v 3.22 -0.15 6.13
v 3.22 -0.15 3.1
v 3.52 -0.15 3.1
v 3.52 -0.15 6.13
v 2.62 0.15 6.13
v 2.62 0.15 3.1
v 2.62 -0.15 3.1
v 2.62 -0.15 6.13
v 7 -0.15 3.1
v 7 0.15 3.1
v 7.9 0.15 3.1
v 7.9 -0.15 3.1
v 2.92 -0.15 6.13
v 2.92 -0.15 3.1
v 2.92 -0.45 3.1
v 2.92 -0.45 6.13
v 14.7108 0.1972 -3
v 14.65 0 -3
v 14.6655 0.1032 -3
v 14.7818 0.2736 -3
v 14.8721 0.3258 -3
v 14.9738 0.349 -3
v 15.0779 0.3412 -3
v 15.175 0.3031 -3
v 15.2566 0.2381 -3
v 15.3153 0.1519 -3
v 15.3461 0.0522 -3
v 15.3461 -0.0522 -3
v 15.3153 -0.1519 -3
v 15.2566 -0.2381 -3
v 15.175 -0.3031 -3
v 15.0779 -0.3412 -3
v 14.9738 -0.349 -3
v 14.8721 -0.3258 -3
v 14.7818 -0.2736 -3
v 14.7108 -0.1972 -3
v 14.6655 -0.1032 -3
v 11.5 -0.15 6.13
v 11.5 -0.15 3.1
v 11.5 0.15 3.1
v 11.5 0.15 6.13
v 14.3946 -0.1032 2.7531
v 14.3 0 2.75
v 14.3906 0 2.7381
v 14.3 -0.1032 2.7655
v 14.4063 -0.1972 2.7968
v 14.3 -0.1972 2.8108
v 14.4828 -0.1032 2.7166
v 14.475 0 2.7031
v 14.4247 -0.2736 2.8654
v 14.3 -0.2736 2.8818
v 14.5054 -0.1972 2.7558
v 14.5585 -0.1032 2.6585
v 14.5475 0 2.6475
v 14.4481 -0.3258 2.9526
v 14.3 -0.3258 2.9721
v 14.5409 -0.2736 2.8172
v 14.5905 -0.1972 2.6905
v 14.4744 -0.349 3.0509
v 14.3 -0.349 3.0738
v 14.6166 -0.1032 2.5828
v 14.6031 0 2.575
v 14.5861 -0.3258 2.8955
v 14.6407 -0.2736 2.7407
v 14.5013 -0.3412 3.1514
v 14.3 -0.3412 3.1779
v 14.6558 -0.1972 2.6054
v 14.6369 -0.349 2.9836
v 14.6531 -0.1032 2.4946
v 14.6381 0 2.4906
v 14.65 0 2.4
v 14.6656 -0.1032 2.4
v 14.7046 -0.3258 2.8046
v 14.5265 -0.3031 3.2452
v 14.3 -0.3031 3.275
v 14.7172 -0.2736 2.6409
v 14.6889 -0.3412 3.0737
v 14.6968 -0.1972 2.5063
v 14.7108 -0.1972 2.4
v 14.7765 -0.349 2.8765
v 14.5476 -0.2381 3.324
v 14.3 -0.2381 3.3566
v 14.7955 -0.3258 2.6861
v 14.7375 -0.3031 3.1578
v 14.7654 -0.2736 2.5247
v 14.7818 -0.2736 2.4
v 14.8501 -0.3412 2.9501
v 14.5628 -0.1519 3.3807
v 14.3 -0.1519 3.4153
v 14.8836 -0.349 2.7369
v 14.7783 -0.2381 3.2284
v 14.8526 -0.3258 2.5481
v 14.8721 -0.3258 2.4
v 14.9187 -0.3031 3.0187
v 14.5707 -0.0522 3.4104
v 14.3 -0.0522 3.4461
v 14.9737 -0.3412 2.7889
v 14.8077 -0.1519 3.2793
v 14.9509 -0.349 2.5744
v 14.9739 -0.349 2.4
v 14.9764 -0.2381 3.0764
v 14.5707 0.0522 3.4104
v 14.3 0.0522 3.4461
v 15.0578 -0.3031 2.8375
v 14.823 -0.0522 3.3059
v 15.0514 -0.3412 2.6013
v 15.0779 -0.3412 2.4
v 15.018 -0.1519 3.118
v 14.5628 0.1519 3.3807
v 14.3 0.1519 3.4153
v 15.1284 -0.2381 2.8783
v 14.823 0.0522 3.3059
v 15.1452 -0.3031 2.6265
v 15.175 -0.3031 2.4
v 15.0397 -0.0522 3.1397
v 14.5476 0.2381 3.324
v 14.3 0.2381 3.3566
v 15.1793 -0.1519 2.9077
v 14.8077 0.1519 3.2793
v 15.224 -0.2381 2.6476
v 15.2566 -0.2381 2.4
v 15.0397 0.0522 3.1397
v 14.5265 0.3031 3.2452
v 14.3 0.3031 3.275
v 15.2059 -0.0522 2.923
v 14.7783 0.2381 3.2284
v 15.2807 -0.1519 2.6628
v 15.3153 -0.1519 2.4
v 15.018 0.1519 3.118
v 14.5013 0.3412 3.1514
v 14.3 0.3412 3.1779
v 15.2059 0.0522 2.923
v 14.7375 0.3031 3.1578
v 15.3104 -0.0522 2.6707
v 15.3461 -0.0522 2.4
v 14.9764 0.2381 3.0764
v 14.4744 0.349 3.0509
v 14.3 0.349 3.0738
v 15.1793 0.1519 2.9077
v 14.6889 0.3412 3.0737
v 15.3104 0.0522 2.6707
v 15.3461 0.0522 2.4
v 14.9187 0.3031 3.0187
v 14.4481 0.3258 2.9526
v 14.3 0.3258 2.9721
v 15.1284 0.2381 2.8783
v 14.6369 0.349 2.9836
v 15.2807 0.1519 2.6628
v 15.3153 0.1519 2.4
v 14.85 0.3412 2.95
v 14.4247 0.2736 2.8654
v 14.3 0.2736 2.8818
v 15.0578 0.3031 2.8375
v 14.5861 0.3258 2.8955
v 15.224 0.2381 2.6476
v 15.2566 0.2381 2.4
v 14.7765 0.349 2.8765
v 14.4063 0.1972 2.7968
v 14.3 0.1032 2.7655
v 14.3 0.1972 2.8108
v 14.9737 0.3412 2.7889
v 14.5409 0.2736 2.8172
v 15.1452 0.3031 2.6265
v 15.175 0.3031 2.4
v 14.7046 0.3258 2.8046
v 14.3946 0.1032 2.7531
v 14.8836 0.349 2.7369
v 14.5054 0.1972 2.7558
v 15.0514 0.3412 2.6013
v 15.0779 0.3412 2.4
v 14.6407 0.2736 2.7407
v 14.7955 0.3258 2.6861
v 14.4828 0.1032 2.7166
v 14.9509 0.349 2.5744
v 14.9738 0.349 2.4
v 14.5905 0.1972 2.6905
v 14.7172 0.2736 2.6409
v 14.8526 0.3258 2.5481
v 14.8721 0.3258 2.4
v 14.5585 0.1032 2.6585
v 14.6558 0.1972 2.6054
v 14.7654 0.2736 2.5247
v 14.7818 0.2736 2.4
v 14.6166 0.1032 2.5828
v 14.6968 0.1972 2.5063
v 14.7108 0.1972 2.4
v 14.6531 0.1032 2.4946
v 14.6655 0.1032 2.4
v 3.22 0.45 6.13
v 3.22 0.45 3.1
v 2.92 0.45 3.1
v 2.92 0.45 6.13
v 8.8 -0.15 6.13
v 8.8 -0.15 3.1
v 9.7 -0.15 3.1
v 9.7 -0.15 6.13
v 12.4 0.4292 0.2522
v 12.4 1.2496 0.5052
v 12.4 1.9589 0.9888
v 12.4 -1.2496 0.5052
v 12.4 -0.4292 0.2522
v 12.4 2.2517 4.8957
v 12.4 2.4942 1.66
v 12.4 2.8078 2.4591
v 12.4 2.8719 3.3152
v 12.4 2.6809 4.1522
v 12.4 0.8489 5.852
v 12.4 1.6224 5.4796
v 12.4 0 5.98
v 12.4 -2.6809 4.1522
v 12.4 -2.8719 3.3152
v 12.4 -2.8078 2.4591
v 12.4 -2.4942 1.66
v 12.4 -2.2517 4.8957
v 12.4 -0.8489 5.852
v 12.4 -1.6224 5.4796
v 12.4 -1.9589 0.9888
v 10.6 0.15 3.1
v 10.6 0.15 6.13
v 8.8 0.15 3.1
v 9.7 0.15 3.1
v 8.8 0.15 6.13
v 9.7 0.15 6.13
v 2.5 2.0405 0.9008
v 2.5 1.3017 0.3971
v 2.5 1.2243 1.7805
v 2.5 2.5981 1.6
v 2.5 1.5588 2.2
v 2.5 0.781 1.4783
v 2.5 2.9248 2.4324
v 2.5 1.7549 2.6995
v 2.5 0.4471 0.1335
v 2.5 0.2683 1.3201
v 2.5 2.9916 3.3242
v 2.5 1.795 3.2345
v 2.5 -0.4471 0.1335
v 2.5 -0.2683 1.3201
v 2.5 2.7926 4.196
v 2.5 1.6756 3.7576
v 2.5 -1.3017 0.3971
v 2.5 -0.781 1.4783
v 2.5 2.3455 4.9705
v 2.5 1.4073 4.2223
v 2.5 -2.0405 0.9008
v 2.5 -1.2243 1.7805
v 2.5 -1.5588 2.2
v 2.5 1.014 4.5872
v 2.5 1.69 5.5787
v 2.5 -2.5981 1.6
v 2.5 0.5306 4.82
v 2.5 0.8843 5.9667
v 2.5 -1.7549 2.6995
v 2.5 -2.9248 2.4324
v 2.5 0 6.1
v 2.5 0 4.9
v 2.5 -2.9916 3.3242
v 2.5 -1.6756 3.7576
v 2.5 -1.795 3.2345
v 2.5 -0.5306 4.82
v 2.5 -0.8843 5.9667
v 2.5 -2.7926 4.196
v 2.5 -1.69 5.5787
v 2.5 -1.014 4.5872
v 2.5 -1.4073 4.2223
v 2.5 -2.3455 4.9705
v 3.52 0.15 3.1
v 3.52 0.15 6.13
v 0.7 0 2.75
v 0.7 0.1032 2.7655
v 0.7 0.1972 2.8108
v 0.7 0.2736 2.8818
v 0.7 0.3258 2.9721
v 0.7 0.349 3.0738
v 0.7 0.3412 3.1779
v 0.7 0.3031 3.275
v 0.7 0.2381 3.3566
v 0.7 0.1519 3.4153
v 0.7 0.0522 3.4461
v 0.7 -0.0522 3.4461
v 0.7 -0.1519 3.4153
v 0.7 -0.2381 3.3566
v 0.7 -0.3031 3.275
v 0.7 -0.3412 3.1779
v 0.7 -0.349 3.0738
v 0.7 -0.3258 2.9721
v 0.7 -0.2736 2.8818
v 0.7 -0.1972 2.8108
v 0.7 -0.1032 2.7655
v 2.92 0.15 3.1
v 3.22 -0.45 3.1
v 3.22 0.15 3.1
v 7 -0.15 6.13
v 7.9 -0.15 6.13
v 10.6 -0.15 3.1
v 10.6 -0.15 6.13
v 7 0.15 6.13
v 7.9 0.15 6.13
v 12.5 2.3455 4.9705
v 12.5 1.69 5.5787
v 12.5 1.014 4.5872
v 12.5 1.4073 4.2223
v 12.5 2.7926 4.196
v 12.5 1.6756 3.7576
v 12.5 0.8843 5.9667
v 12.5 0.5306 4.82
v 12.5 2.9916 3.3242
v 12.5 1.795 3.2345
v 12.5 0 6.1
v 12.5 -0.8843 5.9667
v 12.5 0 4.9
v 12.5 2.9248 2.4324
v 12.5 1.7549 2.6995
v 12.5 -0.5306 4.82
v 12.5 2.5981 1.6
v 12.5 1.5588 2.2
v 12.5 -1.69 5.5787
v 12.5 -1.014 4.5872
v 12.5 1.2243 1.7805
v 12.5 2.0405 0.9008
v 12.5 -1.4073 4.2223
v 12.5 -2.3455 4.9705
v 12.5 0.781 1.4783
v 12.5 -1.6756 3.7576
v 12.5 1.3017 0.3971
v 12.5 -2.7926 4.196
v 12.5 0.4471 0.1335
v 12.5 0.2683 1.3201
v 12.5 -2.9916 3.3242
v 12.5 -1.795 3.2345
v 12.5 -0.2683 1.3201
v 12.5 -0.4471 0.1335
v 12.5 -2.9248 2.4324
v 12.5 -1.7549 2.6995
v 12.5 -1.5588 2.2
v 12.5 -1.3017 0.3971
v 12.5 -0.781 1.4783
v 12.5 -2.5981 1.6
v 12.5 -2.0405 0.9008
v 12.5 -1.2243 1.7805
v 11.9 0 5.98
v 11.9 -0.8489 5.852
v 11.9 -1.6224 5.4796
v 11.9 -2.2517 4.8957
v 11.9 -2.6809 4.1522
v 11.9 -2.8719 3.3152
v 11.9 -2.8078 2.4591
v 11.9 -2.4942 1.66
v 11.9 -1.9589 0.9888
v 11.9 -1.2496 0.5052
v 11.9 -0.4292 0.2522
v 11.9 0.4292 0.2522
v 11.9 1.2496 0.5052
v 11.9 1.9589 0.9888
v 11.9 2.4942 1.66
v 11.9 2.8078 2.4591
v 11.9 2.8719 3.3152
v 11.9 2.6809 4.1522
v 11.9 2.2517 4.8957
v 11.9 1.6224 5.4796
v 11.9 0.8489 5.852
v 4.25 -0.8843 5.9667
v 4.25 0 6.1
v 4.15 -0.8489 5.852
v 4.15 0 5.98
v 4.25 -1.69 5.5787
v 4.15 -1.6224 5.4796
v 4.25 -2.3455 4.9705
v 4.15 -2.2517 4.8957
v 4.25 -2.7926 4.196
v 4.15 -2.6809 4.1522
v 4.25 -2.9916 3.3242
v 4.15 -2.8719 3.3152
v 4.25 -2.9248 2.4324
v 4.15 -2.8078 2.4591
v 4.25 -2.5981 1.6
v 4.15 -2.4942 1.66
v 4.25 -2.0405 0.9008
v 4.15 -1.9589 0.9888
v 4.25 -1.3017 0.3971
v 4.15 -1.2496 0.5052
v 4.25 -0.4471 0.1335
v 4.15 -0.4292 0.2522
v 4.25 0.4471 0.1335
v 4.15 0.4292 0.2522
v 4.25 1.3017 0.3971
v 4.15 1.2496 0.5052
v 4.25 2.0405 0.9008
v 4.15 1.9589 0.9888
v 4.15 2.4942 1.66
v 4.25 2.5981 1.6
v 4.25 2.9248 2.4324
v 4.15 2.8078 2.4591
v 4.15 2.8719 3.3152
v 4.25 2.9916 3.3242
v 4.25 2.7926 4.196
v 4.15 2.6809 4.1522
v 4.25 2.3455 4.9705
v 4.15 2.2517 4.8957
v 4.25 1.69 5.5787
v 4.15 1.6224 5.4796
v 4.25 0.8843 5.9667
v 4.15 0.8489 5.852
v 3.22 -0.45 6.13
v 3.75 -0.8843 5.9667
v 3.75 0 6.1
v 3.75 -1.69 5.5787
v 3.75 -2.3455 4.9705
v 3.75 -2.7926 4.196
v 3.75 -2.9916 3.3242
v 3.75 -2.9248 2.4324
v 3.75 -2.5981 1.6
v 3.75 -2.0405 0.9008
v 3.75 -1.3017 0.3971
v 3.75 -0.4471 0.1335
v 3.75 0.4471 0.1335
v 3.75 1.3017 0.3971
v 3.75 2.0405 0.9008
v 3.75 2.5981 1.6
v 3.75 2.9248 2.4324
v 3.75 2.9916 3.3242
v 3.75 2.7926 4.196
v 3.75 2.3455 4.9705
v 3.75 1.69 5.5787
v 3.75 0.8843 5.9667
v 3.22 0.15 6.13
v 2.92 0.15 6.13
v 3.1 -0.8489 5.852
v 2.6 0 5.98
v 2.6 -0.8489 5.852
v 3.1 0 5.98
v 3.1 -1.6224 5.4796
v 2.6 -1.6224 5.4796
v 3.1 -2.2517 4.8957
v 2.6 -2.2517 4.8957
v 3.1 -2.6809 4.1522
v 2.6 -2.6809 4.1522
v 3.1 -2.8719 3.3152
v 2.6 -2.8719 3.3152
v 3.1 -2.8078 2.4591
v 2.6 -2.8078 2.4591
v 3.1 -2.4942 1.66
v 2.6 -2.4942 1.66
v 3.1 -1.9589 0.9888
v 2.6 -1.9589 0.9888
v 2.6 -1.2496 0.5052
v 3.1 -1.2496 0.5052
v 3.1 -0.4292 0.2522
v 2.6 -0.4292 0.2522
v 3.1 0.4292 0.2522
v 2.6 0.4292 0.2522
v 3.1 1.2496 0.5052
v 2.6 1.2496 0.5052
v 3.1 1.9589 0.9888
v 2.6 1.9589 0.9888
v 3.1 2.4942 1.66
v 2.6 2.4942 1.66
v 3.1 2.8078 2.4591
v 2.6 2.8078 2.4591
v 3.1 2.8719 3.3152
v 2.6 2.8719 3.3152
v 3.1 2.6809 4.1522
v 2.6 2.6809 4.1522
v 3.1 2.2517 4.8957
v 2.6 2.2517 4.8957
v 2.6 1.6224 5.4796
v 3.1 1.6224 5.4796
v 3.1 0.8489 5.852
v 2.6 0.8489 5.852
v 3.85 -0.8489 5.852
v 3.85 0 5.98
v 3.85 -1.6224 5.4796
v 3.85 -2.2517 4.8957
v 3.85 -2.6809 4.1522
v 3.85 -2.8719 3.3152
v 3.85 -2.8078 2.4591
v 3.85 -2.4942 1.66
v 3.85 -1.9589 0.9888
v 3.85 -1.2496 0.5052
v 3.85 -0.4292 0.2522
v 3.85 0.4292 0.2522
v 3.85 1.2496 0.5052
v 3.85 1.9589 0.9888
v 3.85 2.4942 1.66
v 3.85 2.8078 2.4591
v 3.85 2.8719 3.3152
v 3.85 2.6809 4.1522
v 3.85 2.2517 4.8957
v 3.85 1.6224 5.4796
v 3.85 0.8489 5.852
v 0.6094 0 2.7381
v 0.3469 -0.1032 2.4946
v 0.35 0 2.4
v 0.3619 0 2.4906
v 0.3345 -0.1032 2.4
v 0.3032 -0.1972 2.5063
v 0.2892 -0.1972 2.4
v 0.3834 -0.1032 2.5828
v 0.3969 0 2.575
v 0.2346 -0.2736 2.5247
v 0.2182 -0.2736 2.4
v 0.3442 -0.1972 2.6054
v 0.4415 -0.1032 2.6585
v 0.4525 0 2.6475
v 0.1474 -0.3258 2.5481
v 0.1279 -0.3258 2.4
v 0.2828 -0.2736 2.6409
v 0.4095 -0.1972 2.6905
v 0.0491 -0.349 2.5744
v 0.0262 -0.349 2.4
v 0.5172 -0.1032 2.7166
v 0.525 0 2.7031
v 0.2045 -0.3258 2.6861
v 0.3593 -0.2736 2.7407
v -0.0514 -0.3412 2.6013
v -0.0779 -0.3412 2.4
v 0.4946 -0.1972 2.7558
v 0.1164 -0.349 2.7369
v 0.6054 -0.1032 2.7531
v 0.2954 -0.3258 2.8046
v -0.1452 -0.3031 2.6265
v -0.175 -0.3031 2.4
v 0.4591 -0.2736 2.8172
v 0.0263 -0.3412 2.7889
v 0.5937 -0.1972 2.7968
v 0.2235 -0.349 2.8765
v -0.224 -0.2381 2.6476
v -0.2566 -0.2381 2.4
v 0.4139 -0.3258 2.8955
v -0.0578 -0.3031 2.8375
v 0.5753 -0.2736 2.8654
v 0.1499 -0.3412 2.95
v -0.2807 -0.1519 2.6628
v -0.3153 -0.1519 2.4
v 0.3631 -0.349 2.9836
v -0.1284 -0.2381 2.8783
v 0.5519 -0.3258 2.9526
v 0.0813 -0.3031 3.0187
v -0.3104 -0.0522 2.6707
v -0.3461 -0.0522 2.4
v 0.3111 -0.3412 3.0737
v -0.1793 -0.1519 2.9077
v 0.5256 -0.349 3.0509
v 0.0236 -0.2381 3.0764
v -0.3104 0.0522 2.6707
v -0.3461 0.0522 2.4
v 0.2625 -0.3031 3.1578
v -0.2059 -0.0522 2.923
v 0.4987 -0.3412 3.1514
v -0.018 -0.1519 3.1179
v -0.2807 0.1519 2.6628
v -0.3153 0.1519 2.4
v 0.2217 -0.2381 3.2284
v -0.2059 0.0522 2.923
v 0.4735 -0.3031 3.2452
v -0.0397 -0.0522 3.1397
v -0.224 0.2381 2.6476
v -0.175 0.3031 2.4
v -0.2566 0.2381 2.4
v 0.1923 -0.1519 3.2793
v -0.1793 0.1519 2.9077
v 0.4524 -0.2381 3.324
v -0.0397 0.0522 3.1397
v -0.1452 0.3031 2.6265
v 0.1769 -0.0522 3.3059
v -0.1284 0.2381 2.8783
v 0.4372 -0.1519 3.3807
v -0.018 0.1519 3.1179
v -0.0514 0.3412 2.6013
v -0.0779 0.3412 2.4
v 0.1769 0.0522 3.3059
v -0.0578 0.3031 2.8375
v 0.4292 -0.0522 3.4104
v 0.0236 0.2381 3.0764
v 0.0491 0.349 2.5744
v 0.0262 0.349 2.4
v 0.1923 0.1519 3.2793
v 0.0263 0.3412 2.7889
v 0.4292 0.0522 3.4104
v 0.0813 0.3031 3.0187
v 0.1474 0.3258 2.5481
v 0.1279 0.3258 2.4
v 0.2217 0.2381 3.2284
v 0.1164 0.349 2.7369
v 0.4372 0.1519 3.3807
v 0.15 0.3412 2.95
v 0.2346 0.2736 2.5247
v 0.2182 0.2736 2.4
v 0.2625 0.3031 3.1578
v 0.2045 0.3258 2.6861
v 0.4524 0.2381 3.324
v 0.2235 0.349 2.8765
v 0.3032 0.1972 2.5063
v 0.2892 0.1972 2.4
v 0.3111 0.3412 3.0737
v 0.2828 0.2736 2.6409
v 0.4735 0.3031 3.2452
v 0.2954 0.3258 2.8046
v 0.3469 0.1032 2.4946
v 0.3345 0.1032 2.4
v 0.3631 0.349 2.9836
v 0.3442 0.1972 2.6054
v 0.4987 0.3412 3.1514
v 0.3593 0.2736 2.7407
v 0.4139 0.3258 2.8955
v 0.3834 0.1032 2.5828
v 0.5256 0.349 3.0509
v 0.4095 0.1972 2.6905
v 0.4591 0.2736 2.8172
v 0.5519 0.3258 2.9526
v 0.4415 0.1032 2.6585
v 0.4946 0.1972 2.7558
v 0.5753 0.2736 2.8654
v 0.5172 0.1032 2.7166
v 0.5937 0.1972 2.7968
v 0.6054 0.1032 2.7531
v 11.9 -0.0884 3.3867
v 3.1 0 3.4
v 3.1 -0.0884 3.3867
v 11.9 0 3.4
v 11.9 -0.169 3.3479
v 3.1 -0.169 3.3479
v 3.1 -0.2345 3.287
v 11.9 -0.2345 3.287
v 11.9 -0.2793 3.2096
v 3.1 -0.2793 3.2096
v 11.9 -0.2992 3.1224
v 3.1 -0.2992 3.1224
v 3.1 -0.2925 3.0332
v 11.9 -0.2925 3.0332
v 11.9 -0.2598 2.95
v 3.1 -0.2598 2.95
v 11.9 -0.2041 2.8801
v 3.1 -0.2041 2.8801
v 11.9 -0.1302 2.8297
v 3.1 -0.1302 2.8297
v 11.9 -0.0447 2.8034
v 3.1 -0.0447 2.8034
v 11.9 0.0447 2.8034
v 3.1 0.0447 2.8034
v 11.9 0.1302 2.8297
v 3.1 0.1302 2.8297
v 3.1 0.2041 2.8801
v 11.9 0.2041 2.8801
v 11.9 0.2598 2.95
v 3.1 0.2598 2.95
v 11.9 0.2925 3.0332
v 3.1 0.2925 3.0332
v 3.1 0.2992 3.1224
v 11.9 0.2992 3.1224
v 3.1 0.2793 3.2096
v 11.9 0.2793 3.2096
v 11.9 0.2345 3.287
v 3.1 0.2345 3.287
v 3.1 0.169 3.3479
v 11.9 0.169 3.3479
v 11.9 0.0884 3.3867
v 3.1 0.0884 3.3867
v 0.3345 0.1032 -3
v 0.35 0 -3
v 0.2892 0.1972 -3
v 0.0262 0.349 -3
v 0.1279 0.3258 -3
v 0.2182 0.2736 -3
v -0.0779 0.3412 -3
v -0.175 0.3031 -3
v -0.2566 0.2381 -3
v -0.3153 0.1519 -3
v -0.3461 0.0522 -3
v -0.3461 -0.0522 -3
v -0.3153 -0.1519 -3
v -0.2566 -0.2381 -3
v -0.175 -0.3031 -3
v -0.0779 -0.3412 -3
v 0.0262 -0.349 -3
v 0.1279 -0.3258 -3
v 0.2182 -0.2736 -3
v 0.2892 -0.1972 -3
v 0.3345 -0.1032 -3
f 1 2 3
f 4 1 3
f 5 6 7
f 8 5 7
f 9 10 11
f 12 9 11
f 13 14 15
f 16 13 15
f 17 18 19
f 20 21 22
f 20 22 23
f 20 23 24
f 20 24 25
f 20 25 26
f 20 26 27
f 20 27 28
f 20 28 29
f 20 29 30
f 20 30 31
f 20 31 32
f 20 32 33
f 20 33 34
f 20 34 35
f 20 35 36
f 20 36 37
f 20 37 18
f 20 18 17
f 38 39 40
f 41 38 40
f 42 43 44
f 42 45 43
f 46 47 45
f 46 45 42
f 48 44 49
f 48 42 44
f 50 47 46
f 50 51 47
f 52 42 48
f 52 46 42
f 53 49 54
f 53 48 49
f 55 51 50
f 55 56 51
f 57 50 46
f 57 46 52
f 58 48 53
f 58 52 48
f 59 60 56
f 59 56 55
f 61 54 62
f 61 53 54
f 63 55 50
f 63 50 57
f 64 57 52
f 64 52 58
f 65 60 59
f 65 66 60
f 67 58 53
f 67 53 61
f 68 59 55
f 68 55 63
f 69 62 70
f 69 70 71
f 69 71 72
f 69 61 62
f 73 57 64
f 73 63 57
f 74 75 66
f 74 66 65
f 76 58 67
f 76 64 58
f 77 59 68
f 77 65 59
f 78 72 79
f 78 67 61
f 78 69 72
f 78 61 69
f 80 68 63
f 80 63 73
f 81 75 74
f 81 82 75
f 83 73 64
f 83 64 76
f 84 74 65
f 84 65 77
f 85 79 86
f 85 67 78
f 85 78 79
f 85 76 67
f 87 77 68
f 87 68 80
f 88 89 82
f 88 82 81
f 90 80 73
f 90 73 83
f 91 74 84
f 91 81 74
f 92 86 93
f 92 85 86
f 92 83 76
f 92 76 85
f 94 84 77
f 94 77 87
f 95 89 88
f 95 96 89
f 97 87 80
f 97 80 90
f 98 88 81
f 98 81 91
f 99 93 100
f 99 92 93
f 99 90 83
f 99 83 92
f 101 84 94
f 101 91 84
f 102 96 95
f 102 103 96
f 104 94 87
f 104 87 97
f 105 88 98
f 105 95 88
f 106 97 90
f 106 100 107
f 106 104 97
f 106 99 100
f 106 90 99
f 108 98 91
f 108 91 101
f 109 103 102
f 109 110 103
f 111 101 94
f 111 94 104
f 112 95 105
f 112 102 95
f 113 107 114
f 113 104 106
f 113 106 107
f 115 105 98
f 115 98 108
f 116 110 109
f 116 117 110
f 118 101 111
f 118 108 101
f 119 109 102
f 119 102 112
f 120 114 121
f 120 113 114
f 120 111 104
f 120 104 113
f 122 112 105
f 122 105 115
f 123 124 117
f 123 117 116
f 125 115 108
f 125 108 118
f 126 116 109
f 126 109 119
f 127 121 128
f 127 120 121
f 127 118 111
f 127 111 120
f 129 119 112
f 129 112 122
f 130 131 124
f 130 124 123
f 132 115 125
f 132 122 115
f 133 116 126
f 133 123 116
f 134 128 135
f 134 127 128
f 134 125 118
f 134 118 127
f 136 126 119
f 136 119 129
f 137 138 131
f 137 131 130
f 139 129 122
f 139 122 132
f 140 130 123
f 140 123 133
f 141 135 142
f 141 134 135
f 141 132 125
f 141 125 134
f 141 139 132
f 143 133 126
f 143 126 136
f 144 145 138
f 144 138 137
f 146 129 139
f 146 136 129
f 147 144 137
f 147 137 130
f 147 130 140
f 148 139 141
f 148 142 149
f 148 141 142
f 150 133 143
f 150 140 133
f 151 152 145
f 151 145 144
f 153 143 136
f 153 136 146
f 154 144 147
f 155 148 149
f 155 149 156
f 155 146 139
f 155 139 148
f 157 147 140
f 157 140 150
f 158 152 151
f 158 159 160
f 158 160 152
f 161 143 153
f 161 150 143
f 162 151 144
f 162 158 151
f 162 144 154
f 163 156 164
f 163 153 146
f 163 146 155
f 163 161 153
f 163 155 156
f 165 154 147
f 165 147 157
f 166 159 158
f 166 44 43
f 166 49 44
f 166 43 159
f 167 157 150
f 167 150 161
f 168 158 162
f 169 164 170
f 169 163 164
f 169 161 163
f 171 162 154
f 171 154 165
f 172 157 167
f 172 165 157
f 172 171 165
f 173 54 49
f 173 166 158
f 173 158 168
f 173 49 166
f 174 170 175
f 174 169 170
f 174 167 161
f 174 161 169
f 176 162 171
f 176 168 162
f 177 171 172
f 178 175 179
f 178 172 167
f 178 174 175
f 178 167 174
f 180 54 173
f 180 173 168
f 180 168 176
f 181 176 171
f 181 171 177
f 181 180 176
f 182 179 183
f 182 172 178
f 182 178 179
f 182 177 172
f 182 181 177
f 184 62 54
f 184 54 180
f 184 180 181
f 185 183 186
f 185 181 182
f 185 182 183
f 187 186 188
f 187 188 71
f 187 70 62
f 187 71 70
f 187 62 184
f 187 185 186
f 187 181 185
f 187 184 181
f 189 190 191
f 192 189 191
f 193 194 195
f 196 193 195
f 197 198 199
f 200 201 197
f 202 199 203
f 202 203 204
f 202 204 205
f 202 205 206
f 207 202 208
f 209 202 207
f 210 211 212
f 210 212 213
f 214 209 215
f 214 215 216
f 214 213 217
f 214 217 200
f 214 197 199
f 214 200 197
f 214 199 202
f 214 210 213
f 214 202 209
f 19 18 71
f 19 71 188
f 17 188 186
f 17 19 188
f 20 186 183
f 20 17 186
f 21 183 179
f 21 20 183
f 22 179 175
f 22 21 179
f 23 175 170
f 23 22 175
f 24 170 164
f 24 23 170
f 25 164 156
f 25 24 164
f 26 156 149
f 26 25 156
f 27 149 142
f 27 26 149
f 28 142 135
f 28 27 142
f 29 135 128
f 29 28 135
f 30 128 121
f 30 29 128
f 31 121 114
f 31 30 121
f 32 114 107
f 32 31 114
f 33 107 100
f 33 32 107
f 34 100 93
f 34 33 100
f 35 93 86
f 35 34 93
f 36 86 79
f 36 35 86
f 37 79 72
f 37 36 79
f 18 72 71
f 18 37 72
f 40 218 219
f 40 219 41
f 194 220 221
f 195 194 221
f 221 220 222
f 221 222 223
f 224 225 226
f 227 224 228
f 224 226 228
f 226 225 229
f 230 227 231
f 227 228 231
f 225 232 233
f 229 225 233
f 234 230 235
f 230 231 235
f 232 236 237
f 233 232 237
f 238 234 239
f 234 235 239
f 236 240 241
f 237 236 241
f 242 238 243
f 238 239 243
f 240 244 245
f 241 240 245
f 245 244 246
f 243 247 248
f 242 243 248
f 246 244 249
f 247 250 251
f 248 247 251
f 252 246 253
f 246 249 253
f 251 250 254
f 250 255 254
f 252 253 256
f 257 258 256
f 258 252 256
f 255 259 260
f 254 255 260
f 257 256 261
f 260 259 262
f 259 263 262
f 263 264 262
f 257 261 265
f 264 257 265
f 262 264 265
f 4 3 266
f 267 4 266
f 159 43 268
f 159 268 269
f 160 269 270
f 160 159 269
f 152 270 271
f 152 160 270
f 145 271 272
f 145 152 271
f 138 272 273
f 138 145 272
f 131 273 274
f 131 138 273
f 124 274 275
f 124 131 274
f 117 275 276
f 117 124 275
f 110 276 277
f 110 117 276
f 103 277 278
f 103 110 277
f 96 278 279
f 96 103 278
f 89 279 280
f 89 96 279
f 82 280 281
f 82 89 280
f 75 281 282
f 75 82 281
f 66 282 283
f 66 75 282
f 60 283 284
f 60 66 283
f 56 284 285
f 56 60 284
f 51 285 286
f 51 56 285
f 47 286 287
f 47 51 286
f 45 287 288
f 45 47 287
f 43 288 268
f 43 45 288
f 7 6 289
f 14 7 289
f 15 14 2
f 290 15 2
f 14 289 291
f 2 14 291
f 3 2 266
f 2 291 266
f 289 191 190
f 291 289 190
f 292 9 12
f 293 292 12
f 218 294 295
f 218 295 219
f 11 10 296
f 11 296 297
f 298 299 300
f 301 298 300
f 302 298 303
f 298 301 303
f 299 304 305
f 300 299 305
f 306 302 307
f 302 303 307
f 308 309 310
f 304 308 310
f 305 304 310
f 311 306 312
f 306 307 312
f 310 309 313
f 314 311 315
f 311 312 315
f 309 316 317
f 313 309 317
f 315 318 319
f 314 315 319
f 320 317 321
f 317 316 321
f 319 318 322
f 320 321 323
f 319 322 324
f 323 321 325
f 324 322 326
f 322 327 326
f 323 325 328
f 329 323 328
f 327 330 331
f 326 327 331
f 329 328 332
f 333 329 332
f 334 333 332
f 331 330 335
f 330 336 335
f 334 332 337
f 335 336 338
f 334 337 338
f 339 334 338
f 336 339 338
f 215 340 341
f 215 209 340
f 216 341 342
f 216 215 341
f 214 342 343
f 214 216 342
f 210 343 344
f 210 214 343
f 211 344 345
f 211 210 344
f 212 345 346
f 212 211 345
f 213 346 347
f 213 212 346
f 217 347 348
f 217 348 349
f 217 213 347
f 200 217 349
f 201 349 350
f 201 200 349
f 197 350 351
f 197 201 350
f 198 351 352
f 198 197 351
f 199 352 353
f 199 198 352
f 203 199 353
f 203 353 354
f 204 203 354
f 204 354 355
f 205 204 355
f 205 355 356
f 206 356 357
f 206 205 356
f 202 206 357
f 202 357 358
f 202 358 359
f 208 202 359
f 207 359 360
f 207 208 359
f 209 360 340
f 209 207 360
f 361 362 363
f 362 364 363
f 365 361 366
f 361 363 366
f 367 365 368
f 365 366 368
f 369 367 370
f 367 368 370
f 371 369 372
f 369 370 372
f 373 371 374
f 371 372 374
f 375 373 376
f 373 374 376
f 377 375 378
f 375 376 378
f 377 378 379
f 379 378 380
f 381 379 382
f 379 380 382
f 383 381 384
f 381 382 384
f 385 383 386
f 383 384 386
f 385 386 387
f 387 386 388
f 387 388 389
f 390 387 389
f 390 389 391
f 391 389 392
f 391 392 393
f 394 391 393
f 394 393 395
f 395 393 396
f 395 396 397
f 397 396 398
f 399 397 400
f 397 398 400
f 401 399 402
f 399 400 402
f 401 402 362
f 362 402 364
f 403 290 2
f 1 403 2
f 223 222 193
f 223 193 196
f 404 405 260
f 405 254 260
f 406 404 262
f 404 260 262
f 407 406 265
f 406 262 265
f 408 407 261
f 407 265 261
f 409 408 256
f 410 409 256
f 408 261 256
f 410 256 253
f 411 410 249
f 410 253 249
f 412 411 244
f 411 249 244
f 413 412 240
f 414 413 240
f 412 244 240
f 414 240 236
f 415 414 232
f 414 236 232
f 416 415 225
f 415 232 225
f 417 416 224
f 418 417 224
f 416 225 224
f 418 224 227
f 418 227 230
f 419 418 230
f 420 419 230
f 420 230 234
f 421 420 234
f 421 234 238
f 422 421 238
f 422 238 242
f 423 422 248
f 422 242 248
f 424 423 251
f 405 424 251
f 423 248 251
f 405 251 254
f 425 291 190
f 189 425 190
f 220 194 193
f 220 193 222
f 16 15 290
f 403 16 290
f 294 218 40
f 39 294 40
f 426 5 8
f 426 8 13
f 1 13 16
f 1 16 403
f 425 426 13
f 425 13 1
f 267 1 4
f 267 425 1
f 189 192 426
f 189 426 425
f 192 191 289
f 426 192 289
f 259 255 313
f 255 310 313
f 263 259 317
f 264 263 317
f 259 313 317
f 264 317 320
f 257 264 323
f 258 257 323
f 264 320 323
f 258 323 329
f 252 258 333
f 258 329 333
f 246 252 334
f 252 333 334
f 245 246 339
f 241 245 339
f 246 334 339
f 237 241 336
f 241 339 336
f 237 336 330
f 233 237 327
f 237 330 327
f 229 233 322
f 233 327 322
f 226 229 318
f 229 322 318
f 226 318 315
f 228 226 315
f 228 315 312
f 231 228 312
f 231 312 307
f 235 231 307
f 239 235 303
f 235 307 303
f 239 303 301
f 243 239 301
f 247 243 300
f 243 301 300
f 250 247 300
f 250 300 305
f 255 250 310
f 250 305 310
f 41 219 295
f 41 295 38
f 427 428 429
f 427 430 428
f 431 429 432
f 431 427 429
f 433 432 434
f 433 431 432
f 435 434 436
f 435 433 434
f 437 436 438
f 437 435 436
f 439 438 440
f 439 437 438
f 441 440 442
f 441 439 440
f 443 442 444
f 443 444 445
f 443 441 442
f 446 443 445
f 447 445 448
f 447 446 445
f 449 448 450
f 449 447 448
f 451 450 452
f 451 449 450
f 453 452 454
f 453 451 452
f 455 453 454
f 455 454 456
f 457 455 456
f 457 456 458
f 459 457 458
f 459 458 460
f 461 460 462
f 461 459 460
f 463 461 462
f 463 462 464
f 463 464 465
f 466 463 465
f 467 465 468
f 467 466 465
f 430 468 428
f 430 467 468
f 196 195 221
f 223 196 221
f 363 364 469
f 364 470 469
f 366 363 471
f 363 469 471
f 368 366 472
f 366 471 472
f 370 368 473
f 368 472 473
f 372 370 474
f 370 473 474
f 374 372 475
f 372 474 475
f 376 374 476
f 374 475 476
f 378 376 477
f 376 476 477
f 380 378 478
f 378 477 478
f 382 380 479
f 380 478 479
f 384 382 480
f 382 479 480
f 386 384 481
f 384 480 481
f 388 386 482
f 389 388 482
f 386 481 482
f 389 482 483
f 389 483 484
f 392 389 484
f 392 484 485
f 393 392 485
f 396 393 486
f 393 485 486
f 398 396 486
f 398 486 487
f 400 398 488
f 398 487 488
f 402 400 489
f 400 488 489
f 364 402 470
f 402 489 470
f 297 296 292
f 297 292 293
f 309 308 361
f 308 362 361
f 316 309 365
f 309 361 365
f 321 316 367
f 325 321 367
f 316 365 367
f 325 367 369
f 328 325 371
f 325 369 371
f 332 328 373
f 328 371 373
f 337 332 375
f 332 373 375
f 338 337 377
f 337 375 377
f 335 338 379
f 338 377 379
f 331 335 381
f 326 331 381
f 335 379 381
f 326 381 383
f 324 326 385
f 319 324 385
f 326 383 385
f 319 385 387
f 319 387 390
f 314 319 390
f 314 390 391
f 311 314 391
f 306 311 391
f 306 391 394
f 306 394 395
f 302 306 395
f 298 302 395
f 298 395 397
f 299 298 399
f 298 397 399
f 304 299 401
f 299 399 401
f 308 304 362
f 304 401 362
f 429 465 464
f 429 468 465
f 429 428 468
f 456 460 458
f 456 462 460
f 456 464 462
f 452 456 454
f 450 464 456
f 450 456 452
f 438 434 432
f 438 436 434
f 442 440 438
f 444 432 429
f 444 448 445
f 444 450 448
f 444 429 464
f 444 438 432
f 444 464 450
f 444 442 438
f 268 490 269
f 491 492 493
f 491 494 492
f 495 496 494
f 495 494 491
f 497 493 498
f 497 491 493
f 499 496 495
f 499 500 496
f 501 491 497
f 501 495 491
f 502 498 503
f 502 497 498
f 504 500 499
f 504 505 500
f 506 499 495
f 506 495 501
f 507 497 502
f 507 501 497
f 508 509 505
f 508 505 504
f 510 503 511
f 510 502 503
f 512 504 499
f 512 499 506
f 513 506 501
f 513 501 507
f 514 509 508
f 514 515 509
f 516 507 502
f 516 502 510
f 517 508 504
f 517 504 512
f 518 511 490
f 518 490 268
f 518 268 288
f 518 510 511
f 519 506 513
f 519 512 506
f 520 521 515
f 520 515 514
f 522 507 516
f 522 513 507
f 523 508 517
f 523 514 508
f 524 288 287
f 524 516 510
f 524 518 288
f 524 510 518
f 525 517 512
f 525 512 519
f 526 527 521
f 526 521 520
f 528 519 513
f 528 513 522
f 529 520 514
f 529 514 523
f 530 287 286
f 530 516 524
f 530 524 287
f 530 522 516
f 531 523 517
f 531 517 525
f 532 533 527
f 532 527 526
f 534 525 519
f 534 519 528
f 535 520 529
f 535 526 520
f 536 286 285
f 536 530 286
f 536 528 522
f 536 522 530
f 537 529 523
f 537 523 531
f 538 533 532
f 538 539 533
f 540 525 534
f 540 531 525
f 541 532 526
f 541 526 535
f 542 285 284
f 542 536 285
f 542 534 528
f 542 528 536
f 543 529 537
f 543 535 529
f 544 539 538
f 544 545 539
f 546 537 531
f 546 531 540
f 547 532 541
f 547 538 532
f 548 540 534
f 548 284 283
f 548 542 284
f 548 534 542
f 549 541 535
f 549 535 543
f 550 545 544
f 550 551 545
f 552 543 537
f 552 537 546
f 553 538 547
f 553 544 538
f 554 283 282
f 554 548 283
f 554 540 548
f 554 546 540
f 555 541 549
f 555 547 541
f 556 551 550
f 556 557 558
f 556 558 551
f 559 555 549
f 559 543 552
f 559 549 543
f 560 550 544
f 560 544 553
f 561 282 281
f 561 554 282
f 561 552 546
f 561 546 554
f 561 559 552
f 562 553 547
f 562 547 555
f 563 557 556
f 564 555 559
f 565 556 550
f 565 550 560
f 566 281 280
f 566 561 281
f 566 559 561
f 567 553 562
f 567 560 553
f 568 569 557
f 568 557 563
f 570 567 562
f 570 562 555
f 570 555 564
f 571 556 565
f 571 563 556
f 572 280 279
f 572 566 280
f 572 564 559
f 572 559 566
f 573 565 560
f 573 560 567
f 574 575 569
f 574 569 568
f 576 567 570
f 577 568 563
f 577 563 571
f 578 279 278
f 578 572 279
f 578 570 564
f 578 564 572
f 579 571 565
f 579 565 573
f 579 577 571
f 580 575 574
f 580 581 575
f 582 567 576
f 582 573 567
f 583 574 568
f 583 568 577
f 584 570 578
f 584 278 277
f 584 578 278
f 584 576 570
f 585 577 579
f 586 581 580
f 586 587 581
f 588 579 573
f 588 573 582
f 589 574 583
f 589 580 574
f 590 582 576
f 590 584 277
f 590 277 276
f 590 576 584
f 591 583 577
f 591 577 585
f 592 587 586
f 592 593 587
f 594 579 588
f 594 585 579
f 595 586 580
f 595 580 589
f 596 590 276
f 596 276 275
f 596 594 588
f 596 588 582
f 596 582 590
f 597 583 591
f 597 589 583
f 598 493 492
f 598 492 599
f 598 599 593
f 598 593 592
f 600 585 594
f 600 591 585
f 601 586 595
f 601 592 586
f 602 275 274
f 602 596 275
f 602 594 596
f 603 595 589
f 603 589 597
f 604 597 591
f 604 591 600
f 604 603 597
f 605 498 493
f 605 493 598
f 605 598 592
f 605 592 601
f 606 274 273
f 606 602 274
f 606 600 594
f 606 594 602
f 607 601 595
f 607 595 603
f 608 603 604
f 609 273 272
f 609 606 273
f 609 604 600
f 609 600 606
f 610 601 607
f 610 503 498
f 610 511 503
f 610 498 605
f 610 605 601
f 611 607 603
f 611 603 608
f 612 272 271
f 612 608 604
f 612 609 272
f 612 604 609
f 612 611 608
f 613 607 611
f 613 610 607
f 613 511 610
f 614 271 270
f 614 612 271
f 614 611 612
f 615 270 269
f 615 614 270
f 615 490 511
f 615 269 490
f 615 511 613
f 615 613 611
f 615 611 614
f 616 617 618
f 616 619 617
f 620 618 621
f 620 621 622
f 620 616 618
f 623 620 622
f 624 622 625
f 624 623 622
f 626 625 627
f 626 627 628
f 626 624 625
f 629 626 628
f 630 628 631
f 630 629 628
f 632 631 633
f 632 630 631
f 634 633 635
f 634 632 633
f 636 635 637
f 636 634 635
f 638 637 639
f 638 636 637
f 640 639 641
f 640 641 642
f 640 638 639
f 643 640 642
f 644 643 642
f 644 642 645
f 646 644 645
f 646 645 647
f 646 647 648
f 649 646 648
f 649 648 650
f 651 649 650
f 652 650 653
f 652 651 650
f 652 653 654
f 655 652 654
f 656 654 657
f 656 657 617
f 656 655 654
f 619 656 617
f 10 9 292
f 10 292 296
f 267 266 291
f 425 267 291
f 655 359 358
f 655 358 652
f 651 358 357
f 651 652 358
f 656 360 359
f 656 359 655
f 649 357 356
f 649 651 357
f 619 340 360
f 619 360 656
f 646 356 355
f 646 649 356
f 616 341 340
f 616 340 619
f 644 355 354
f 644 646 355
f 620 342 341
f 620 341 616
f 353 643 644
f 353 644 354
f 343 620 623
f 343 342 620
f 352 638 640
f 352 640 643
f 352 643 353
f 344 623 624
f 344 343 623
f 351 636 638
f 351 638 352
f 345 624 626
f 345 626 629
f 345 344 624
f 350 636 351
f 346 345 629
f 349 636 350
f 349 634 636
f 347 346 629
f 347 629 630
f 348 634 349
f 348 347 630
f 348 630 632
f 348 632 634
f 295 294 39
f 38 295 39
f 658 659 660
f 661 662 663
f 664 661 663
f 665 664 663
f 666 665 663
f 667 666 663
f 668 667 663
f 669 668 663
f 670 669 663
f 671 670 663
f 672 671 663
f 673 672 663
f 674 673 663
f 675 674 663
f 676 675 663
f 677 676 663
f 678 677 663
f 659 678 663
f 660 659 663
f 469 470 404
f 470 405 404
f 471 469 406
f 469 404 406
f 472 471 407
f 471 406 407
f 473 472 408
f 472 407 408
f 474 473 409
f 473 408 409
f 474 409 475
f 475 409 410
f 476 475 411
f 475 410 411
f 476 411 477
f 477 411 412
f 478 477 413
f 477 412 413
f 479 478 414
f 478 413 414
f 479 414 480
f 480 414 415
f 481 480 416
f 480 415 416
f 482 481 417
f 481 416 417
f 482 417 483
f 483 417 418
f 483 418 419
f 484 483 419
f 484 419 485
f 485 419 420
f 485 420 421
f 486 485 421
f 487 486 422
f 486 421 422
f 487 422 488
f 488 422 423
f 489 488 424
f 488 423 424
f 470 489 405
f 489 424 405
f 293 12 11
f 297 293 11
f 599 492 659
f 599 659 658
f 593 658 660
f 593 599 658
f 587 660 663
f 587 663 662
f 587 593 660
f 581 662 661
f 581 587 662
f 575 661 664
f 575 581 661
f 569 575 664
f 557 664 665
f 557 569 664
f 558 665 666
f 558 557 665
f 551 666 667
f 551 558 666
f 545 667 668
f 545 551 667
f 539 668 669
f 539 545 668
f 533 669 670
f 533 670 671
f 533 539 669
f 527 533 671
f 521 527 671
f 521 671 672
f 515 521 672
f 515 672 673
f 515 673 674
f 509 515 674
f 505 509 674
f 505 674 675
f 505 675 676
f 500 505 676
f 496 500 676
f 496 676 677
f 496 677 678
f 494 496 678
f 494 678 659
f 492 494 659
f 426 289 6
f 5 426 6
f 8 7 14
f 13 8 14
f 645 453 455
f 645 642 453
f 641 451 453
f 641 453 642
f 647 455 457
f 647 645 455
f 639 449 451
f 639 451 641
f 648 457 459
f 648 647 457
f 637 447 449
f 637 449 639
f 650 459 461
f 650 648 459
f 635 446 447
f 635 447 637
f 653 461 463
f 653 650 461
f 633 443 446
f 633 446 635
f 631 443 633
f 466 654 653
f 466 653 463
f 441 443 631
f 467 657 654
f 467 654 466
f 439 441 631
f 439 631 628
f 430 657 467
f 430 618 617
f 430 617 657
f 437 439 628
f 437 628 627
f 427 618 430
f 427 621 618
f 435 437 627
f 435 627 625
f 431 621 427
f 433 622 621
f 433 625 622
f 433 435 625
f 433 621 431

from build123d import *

# Parameters (mm, degrees)
SKETCH_R    = 0.35
SKETCH004_W = 0.9
SKETCH004_H = 0.3
PAD_DEPTH   = 3.03


with BuildPart() as sweep_body:
    # Sweep: sweep along a path in Sketch001
    with BuildLine(Plane.XZ) as sweep_path:
        Line((0, -3), (0, 2.4))
        ThreePointArc((0, 2.4), (0.205022, 2.894971), (0.699989, 3.1))
        Line((0.699989, 3.1), (14.3, 3.1))
        ThreePointArc((14.3, 3.1), (14.794975, 2.894975), (15, 2.4))
        Line((15, 2.4), (15, -3))
    # Sketch → Sweep (sweep)
    with BuildSketch(Plane.XY.offset(-2)):
        Circle(SKETCH_R)
    sweep(path=sweep_path.line)


with BuildPart() as revolution:
    # Sketch002 → Revolution (revolve)
    with BuildSketch(Plane.XZ):
        Polygon((2.5, 6.1), (2.5, 4.9), (12.5, 4.9), (12.5, 6.1), (4.25, 6.1), (4.15, 5.98), (3.85, 5.98), (3.75, 6.1), align=None)
    revolve(axis=Axis((6.97588, 0, 3.1), (1, 0, 0)))


with BuildPart() as revolution001:
    # Sketch003 → Revolution001 (revolve)
    with BuildSketch(Plane.XZ):
        Polygon((2.6, 5.98), (3.1, 5.98), (3.1, 3.4), (11.9, 3.4), (11.9, 5.98), (12.4, 5.98), (12.4, 3.1), (2.6, 3.1), align=None)
    revolve(axis=Axis((6.97588, 0, 3.1), (1, 0, 0)))


with BuildPart() as pad:
    # Sketch004 → Pad (new body)
    with BuildSketch(Plane.XY.offset(3.1)):
        with Locations((11.05, 0)):
            Rectangle(SKETCH004_W, SKETCH004_H)
        with Locations((9.25, 0)):
            Rectangle(SKETCH004_W, SKETCH004_H)
        with Locations((7.45, 0)):
            Rectangle(SKETCH004_W, SKETCH004_H)
        Polygon((2.92, 0.15), (2.62, 0.15), (2.62, -0.15), (2.92, -0.15), (2.92, -0.45), (3.22, -0.45), (3.22, -0.15), (3.52, -0.15), (3.52, 0.15), (3.22, 0.15), (3.22, 0.45), (2.92, 0.45), align=None)
    extrude(amount=PAD_DEPTH)


solid = Compound([sweep_body.part, revolution.part, revolution001.part, pad.part])
